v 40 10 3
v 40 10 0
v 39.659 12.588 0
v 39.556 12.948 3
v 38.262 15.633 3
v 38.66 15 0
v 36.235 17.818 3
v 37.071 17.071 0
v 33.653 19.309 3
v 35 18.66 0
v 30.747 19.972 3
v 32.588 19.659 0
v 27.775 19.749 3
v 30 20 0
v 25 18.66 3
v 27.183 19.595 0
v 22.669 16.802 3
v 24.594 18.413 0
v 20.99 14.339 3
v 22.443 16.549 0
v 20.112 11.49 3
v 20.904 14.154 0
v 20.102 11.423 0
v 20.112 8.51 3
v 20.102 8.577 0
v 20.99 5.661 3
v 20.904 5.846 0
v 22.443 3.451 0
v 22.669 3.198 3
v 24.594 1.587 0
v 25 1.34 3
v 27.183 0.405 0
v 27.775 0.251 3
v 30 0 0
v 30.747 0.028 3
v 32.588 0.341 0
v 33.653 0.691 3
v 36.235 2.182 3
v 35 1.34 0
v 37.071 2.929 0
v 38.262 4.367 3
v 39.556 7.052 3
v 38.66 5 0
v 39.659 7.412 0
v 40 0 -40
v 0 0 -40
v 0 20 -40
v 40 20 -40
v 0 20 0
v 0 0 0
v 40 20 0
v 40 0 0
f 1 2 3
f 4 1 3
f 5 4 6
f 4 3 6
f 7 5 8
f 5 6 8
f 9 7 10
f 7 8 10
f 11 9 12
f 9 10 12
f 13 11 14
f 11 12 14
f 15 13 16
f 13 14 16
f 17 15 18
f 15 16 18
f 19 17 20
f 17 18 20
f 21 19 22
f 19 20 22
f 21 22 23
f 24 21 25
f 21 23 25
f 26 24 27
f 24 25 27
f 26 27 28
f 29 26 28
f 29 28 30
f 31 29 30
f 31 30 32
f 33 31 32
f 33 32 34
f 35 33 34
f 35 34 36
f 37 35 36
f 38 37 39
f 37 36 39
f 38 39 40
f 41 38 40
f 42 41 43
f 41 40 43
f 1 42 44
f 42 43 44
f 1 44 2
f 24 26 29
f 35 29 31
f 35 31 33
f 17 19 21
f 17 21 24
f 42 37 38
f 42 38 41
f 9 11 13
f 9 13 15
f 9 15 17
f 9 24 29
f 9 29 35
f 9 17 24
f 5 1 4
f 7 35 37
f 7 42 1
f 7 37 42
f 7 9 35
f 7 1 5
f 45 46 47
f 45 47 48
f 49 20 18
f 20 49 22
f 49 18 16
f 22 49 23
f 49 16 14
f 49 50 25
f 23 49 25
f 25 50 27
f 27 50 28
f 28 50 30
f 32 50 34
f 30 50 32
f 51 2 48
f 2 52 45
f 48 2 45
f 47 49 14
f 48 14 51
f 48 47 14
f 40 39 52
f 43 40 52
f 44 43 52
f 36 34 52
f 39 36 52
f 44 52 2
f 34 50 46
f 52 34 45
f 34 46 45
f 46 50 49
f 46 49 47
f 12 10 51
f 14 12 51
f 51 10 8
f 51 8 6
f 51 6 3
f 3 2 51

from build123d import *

# Parameters (mm, degrees)
SKETCH1_W           = 40
SKETCH1_H           = 40
BOSS_EXTRUDE1_DEPTH = 20
SKETCH3_R           = 10
BOSS_EXTRUDE2_DEPTH = 3


with BuildPart() as part:
    # Sketch1 → Boss-Extrude1 (new body)
    with BuildSketch(Plane(origin=(0, 0, 0), x_dir=(1, 0, 0), z_dir=(0, 1, 0))):
        with Locations((20, 20)):
            Rectangle(SKETCH1_W, SKETCH1_H)
    extrude(amount=BOSS_EXTRUDE1_DEPTH)

    # Sketch3 → Boss-Extrude2 (add)
    with BuildSketch(Plane.XY):
        with Locations((30, 10)):
            Circle(SKETCH3_R)
    extrude(amount=BOSS_EXTRUDE2_DEPTH)


solid = part.part
